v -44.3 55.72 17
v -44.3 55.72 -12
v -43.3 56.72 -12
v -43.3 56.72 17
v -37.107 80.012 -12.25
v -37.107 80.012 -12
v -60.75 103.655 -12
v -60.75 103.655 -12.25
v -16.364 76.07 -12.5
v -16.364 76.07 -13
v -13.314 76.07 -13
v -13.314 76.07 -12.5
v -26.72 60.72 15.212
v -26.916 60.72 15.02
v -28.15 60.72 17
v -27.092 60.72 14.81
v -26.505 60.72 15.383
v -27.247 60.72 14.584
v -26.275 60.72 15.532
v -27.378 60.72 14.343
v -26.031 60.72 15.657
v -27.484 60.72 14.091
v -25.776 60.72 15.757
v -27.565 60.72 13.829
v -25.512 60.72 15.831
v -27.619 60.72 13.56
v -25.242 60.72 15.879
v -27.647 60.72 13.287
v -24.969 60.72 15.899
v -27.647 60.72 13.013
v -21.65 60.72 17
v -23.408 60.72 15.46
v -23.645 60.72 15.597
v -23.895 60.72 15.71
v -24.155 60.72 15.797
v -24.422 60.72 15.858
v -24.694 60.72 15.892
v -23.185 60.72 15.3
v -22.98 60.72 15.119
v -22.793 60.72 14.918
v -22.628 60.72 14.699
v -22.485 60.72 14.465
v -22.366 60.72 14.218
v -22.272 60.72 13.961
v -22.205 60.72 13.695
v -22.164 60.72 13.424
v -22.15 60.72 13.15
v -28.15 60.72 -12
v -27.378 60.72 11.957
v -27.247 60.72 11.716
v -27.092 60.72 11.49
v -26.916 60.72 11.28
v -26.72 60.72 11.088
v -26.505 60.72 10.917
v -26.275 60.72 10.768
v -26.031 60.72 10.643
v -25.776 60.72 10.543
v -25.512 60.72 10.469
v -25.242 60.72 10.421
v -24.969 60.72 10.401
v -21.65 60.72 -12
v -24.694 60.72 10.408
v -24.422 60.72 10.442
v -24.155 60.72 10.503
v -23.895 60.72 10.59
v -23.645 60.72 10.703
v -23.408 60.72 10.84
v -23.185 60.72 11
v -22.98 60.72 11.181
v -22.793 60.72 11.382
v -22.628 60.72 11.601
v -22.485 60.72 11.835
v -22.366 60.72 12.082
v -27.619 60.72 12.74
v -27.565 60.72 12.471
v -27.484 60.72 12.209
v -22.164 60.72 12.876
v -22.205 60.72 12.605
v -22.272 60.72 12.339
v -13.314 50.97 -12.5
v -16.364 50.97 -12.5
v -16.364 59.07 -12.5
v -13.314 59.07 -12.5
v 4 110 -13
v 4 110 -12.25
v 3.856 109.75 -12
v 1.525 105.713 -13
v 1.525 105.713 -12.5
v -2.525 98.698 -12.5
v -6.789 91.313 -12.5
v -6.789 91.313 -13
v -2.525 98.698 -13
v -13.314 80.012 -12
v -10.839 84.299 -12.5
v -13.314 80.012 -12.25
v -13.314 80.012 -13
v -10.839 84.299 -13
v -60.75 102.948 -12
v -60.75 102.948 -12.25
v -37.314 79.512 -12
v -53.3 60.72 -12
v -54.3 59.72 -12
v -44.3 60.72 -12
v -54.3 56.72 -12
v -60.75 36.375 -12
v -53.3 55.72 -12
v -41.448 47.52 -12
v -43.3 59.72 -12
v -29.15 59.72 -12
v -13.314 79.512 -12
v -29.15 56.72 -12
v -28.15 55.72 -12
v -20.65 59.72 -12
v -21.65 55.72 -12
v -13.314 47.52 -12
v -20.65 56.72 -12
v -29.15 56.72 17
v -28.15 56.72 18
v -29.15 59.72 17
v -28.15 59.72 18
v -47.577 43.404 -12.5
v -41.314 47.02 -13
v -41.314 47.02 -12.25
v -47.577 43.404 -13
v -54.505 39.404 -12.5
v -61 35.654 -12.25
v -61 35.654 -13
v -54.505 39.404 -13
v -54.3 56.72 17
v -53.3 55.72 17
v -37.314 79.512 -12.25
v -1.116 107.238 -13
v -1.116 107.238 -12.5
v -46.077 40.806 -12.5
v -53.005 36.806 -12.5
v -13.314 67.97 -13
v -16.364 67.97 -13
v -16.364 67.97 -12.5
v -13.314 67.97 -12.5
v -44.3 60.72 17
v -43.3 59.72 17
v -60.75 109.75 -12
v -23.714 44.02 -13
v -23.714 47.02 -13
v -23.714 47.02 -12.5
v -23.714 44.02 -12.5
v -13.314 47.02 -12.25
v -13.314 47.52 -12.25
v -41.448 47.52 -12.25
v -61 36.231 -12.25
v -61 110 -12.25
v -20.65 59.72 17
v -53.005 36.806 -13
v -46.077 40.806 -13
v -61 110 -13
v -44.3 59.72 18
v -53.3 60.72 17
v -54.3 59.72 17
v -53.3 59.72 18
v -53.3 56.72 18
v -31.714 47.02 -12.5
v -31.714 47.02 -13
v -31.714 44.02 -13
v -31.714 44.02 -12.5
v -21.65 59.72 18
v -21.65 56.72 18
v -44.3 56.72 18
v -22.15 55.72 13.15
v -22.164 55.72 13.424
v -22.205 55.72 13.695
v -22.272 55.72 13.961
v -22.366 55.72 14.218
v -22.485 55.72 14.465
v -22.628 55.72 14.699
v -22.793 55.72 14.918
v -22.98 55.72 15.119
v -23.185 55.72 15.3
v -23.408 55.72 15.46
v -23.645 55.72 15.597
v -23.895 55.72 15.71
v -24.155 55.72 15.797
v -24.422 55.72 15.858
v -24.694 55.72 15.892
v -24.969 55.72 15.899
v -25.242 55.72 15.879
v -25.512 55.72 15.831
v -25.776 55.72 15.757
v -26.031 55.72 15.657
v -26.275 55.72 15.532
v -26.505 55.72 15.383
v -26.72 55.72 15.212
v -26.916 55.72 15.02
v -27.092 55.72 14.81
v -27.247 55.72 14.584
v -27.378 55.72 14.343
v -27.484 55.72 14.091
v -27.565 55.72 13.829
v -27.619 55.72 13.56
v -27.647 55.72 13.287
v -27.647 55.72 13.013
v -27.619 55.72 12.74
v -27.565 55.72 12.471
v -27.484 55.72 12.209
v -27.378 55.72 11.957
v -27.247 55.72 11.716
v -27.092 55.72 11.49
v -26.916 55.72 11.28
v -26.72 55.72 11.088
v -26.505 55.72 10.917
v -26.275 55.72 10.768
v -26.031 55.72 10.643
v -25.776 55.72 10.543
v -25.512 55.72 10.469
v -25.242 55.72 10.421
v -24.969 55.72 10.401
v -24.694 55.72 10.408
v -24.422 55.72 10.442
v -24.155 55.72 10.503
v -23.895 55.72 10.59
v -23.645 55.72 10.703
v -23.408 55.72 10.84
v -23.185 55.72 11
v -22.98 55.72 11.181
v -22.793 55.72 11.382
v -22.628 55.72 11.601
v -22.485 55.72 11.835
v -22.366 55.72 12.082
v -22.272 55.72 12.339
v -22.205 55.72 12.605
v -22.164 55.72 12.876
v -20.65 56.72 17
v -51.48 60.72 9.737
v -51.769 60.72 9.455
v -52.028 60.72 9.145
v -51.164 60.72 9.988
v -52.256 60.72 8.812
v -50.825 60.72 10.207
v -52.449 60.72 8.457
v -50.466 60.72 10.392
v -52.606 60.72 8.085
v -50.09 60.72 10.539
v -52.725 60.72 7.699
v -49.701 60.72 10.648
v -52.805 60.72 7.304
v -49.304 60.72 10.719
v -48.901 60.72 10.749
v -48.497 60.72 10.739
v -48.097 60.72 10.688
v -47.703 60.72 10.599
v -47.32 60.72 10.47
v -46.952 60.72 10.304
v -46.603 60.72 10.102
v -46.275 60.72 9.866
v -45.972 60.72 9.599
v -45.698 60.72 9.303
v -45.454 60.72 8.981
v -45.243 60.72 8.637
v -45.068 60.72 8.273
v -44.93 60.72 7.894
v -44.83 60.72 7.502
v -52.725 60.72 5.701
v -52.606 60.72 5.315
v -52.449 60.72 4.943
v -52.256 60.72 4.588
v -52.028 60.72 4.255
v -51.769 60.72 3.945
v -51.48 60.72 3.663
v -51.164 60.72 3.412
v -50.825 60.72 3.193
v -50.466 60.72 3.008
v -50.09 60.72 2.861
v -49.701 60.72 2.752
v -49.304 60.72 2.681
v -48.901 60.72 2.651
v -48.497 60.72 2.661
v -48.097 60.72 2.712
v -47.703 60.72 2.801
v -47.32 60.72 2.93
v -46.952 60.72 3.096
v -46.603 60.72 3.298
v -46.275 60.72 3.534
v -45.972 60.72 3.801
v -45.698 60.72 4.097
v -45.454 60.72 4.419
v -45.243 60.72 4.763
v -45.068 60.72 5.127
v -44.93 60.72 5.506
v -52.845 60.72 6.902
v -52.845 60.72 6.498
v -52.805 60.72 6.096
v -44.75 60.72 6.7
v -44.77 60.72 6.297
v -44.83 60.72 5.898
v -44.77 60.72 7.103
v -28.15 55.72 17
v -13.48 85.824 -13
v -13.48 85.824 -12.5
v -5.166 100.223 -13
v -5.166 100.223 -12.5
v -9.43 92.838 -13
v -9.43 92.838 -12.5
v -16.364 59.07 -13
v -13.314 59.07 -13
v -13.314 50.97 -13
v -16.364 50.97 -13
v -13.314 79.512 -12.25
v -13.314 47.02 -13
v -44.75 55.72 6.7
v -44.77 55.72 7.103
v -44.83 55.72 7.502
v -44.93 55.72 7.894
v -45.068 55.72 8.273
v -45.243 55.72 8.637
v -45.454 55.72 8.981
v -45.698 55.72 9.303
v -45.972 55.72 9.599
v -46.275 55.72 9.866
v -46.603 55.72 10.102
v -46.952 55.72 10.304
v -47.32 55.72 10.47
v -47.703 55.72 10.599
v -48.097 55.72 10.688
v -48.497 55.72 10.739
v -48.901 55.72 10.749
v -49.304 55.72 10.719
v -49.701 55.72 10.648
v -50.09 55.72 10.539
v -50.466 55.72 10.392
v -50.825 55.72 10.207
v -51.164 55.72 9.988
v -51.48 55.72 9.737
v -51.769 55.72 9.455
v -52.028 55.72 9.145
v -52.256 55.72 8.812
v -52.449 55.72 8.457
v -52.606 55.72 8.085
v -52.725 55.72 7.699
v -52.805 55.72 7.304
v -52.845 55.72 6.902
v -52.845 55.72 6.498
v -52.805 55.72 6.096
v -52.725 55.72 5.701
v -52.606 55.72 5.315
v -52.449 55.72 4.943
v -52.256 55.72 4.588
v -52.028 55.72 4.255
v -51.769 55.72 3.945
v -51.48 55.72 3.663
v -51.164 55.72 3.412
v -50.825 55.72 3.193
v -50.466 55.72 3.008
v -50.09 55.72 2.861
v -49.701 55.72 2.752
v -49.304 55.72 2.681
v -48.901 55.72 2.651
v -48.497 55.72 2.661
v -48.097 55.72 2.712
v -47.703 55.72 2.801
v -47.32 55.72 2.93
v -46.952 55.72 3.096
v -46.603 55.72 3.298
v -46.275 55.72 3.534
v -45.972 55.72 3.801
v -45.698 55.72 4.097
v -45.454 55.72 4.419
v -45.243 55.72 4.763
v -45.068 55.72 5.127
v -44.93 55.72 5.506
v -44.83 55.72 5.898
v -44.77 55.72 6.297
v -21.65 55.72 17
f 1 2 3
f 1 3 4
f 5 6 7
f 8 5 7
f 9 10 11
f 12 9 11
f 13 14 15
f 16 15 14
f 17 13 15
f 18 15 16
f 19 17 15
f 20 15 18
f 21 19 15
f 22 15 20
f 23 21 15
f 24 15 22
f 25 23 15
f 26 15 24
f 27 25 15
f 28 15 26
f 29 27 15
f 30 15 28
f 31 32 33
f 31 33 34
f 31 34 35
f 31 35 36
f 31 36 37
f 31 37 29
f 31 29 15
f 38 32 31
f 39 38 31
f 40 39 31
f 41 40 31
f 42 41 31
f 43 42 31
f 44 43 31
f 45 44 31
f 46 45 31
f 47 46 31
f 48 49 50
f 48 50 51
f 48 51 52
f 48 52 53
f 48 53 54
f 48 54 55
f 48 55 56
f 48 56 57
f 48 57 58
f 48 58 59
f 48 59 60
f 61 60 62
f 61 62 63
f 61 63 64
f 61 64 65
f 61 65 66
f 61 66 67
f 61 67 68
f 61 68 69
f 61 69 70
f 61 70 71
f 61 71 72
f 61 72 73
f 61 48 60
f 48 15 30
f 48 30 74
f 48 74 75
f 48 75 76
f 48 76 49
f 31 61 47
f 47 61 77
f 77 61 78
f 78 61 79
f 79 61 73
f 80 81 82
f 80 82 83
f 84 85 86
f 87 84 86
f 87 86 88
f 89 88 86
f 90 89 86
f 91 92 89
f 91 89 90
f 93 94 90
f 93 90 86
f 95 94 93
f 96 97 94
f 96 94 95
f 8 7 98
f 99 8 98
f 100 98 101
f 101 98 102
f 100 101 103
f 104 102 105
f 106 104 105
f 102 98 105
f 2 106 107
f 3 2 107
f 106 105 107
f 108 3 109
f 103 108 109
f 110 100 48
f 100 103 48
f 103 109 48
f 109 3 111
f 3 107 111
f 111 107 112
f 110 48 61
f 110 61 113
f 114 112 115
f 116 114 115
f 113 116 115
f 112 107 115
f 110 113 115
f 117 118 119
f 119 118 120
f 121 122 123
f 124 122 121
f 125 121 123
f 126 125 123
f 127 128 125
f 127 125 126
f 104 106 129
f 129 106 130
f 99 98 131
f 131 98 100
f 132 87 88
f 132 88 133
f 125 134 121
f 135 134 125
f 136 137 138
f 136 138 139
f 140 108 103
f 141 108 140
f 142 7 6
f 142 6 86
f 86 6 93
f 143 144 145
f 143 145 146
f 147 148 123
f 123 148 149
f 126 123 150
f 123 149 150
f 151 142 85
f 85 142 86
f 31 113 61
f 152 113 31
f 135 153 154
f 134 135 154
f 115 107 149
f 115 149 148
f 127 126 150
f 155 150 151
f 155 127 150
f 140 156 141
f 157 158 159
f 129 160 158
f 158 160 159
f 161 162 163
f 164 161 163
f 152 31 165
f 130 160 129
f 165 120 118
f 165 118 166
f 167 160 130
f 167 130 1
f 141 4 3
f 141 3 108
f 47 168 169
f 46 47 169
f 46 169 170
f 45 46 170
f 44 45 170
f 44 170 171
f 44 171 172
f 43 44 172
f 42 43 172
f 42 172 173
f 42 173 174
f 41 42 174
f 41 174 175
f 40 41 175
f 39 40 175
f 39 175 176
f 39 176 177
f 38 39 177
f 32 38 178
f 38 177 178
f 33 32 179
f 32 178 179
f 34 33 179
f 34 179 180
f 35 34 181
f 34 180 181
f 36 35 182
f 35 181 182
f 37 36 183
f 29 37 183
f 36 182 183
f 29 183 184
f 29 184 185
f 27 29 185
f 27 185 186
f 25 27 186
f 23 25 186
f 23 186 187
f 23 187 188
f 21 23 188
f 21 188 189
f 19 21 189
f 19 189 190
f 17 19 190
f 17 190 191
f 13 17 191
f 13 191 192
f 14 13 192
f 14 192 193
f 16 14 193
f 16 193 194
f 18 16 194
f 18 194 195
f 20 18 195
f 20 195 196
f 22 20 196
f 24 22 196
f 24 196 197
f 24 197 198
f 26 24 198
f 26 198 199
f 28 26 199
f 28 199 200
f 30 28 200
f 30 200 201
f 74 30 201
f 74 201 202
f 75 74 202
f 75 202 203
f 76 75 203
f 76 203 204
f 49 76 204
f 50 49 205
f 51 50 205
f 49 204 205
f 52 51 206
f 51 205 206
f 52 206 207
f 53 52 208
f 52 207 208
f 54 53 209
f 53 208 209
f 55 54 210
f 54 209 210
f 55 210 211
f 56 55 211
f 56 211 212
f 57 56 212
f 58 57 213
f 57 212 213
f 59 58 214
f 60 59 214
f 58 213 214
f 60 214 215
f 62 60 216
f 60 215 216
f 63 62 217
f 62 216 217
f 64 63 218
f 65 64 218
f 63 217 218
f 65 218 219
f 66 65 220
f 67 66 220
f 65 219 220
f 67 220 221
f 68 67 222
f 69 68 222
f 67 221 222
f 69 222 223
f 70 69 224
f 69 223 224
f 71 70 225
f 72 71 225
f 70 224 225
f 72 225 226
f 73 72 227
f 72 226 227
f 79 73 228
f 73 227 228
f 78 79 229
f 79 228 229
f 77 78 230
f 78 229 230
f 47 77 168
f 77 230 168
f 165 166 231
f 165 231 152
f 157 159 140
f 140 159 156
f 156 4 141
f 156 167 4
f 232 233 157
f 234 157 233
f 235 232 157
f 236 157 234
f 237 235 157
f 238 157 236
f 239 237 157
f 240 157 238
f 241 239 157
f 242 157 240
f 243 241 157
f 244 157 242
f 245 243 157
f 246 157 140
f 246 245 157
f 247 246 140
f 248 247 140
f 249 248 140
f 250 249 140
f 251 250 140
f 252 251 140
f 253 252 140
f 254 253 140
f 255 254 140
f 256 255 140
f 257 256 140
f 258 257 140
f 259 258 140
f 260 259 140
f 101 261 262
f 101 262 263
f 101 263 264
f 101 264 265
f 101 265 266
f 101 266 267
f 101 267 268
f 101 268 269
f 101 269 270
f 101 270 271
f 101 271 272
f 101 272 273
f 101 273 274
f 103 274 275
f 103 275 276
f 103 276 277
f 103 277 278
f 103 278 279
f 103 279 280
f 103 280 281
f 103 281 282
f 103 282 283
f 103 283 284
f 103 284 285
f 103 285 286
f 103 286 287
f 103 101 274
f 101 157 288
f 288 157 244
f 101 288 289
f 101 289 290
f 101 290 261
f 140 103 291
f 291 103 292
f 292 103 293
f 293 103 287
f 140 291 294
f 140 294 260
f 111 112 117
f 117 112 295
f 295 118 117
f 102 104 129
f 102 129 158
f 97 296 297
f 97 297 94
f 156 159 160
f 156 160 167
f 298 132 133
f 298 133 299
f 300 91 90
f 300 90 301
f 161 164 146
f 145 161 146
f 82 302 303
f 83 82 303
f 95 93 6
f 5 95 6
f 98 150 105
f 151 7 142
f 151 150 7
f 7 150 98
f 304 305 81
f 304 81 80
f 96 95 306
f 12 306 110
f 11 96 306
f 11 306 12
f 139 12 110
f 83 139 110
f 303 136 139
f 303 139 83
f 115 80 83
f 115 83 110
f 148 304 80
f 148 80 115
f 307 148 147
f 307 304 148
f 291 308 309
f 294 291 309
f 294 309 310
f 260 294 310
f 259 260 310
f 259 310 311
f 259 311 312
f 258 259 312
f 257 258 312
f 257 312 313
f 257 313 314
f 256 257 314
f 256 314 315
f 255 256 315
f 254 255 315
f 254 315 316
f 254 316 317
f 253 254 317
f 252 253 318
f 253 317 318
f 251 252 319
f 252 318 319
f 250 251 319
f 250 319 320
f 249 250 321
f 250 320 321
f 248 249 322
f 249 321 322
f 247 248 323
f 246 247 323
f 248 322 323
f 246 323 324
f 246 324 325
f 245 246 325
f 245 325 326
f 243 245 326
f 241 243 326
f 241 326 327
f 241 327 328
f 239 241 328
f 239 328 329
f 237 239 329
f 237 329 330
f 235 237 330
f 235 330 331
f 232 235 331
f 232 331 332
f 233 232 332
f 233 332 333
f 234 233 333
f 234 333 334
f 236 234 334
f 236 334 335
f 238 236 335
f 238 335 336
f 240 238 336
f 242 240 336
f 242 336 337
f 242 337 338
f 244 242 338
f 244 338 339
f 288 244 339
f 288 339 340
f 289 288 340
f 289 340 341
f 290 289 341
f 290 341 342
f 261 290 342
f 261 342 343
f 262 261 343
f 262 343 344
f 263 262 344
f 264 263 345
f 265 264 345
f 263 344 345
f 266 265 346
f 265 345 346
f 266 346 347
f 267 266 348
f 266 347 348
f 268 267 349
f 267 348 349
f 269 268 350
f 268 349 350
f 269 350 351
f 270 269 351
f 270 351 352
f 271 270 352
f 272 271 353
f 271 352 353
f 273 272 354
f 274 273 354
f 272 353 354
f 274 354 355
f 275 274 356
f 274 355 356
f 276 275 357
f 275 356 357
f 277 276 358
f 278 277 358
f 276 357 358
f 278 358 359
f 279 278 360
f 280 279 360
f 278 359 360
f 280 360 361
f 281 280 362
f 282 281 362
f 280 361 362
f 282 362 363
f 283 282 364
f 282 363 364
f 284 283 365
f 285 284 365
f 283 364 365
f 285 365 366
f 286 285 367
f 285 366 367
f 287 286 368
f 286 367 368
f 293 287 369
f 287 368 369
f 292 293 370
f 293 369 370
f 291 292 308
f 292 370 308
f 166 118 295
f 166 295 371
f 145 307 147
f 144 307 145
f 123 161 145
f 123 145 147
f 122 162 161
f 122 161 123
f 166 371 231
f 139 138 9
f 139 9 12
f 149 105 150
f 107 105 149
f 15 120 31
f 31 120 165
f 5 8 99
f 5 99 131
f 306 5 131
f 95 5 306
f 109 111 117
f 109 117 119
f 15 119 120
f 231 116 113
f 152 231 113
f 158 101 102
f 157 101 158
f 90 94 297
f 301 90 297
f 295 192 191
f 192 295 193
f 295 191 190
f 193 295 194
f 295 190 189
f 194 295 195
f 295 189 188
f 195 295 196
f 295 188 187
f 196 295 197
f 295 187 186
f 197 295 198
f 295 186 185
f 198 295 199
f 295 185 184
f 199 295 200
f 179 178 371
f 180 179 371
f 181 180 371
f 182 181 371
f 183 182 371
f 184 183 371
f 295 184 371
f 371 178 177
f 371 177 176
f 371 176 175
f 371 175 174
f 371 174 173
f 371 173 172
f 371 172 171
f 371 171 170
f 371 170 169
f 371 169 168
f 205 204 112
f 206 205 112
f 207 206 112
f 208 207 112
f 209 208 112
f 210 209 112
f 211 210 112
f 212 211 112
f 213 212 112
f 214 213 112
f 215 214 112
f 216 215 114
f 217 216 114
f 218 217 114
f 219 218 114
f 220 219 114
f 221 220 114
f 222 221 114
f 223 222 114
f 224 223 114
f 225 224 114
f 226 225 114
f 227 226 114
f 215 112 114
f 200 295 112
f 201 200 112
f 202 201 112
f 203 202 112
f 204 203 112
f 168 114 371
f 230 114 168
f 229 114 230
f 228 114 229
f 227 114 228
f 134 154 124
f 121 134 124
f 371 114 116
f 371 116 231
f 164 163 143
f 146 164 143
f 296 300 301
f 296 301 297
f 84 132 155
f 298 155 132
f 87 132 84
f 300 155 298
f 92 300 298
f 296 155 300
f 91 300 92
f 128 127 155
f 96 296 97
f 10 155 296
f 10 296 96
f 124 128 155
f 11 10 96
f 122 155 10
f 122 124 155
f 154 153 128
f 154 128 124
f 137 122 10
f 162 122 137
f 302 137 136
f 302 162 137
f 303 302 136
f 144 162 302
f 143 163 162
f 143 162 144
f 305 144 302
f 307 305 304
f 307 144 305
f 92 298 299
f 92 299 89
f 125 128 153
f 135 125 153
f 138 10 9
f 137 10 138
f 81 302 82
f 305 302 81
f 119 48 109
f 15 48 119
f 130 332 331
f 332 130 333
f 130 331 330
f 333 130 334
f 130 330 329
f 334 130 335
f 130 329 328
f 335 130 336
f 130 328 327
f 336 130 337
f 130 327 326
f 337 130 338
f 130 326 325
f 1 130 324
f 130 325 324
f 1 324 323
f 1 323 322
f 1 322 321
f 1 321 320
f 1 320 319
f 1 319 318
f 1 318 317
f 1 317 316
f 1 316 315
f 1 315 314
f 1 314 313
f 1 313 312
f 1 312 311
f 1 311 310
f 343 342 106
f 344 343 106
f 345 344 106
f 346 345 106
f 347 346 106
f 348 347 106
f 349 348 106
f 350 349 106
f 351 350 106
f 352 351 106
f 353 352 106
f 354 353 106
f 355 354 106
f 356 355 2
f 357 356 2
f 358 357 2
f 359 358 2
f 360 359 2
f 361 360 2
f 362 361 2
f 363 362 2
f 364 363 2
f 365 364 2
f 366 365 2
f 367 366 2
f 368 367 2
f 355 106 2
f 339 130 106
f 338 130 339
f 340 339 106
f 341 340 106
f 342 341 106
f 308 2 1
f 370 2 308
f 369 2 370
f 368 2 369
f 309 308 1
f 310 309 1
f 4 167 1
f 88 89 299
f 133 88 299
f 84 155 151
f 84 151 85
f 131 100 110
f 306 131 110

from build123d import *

# Parameters (mm, degrees)
PAD015_DEPTH    = 1
POCKET006_DEPTH = 0.25
CHAMFER003_SIZE = 0.25
POCKET007_DEPTH = 0.25
SKETCH024_W     = 3.05
SKETCH024_H     = 8.1
POCKET008_DEPTH = 0.5
SKETCH025_W     = 8
SKETCH025_H     = 3
PAD016_DEPTH    = 0.5
SKETCH026_W     = 11
SKETCH026_H     = 5
SKETCH026_W_2   = 8.5
PAD017_DEPTH    = 30
SKETCH027_R     = 4.05
SKETCH027_R_2   = 2.75
POCKET009_DEPTH = 54.281
CHAMFER004_SIZE = 1


with BuildPart() as part:
    # Sketch021 (on Face1 of Binder010) → Pad015 (new body)
    with BuildSketch(Plane(origin=(0, 0, -13), x_dir=(1, 0, 0), z_dir=(0, 0, -1))):
        Polygon((4, -110), (-13.313708499, -80.0117772123), (-13.313708499, -47.019624501), (-41.313708499, -47.019624501), (-61, -35.6537388036), (-61, -110), align=None)
    extrude(amount=-PAD015_DEPTH)

    # Sketch022 (on Face8 of Pad015) → Pocket006 (cut)
    with BuildSketch(Plane.XY.offset(-12)):
        Polygon((-13.313708499, 47.019624501), (-41.313708499, 47.019624501), (-61, 35.6537388036), (-61, 36.2310890728), (-41.4476830952, 47.519624501), (-13.313708499, 47.519624501), align=None)
    extrude(amount=-POCKET006_DEPTH, mode=Mode.SUBTRACT)

    # Chamfer003
    chamfer003_edges = [part.edges().sort_by_distance(p)[0] for p in [
        (-61, 73.115545, -12),
        (-28.5, 110, -12),
    ]]
    chamfer(chamfer003_edges, length=CHAMFER003_SIZE)

    # Sketch023 (on Face5 of Chamfer003) → Pocket007 (cut)
    with BuildSketch(Plane.XY.offset(-12)):
        Polygon((-13.313708499, 80.0117772123), (-37.1066017178, 80.0117772123), (-60.75, 103.6551754945), (-60.75, 102.9480687133), (-37.313708499, 79.5117772123), (-13.313708499, 79.5117772123), align=None)
    extrude(amount=-POCKET007_DEPTH, mode=Mode.SUBTRACT)

    # Sketch024 (on Face4 of Pocket007) → Pocket008 (cut)
    with BuildSketch(Plane(origin=(0, 0, -13), x_dir=(1, 0, 0), z_dir=(0, 0, -1))):
        with Locations((-14.838708499, -55.019624501)):
            Rectangle(SKETCH024_W, SKETCH024_H)
        with Locations((-14.838708499, -72.019624501)):
            Rectangle(SKETCH024_W, SKETCH024_H)
        Polygon((-10.838708499, -84.2986029611), (-6.788708499, -91.3134087317), (-9.4300859805, -92.8384087317), (-13.4800859805, -85.8236029611), align=None)
        Polygon((-2.525, -98.6983684806), (1.525, -105.7131742513), (-1.1163774815, -107.2381742513), (-5.1663774815, -100.2233684806), align=None)
    extrude(amount=-POCKET008_DEPTH, mode=Mode.SUBTRACT)

    # Sketch025 (on Face3 of Pocket008) → Pad016 (join)
    with BuildSketch(Plane(origin=(0, 0, -13), x_dir=(1, 0, 0), z_dir=(0, 0, -1))):
        with Locations((-27.713708499, -45.519624501)):
            Rectangle(SKETCH025_W, SKETCH025_H)
        Polygon((-47.5766062413, -43.4037388036), (-54.5048094716, -39.4037388036), (-53.0048094716, -36.8056625922), (-46.0766062413, -40.8056625922), align=None)
    extrude(amount=-PAD016_DEPTH)

    # Sketch026 (on Face28 of Pad016) → Pad017 (join)
    with BuildSketch(Plane.XY.offset(-12)):
        with Locations((-48.8, 58.22)):
            Rectangle(SKETCH026_W, SKETCH026_H)
        with Locations((-24.9, 58.22)):
            Rectangle(SKETCH026_W_2, SKETCH026_H)
    extrude(amount=PAD017_DEPTH)

    # Sketch027 (on Face45 of Pad017) → Pocket009 (cut, through all)
    with BuildSketch(Plane.XZ.offset(-55.72)):
        with Locations((-48.8, 6.7)):
            Circle(SKETCH027_R)
        with Locations((-24.9, 13.15)):
            Circle(SKETCH027_R_2)
    extrude(amount=-POCKET009_DEPTH, mode=Mode.SUBTRACT)

    # Chamfer004
    chamfer004_edges = [part.edges().sort_by_distance(p)[0] for p in [
        (-54.3, 60.72, 3),
        (-54.3, 58.22, 18),
        (-48.8, 60.72, 18),
        (-43.3, 58.22, 18),
        (-48.8, 55.72, 18),
        (-54.3, 55.72, 3),
        (-43.3, 55.72, 3),
        (-29.15, 60.72, 3),
        (-29.15, 58.22, 18),
        (-24.9, 60.72, 18),
        (-24.9, 55.72, 18),
        (-29.15, 55.72, 3),
        (-43.3, 60.72, 3),
        (-20.65, 55.72, 3),
        (-20.65, 60.72, 3),
        (-20.65, 58.22, 18),
    ]]
    chamfer(chamfer004_edges, length=CHAMFER004_SIZE)


solid = part.part
